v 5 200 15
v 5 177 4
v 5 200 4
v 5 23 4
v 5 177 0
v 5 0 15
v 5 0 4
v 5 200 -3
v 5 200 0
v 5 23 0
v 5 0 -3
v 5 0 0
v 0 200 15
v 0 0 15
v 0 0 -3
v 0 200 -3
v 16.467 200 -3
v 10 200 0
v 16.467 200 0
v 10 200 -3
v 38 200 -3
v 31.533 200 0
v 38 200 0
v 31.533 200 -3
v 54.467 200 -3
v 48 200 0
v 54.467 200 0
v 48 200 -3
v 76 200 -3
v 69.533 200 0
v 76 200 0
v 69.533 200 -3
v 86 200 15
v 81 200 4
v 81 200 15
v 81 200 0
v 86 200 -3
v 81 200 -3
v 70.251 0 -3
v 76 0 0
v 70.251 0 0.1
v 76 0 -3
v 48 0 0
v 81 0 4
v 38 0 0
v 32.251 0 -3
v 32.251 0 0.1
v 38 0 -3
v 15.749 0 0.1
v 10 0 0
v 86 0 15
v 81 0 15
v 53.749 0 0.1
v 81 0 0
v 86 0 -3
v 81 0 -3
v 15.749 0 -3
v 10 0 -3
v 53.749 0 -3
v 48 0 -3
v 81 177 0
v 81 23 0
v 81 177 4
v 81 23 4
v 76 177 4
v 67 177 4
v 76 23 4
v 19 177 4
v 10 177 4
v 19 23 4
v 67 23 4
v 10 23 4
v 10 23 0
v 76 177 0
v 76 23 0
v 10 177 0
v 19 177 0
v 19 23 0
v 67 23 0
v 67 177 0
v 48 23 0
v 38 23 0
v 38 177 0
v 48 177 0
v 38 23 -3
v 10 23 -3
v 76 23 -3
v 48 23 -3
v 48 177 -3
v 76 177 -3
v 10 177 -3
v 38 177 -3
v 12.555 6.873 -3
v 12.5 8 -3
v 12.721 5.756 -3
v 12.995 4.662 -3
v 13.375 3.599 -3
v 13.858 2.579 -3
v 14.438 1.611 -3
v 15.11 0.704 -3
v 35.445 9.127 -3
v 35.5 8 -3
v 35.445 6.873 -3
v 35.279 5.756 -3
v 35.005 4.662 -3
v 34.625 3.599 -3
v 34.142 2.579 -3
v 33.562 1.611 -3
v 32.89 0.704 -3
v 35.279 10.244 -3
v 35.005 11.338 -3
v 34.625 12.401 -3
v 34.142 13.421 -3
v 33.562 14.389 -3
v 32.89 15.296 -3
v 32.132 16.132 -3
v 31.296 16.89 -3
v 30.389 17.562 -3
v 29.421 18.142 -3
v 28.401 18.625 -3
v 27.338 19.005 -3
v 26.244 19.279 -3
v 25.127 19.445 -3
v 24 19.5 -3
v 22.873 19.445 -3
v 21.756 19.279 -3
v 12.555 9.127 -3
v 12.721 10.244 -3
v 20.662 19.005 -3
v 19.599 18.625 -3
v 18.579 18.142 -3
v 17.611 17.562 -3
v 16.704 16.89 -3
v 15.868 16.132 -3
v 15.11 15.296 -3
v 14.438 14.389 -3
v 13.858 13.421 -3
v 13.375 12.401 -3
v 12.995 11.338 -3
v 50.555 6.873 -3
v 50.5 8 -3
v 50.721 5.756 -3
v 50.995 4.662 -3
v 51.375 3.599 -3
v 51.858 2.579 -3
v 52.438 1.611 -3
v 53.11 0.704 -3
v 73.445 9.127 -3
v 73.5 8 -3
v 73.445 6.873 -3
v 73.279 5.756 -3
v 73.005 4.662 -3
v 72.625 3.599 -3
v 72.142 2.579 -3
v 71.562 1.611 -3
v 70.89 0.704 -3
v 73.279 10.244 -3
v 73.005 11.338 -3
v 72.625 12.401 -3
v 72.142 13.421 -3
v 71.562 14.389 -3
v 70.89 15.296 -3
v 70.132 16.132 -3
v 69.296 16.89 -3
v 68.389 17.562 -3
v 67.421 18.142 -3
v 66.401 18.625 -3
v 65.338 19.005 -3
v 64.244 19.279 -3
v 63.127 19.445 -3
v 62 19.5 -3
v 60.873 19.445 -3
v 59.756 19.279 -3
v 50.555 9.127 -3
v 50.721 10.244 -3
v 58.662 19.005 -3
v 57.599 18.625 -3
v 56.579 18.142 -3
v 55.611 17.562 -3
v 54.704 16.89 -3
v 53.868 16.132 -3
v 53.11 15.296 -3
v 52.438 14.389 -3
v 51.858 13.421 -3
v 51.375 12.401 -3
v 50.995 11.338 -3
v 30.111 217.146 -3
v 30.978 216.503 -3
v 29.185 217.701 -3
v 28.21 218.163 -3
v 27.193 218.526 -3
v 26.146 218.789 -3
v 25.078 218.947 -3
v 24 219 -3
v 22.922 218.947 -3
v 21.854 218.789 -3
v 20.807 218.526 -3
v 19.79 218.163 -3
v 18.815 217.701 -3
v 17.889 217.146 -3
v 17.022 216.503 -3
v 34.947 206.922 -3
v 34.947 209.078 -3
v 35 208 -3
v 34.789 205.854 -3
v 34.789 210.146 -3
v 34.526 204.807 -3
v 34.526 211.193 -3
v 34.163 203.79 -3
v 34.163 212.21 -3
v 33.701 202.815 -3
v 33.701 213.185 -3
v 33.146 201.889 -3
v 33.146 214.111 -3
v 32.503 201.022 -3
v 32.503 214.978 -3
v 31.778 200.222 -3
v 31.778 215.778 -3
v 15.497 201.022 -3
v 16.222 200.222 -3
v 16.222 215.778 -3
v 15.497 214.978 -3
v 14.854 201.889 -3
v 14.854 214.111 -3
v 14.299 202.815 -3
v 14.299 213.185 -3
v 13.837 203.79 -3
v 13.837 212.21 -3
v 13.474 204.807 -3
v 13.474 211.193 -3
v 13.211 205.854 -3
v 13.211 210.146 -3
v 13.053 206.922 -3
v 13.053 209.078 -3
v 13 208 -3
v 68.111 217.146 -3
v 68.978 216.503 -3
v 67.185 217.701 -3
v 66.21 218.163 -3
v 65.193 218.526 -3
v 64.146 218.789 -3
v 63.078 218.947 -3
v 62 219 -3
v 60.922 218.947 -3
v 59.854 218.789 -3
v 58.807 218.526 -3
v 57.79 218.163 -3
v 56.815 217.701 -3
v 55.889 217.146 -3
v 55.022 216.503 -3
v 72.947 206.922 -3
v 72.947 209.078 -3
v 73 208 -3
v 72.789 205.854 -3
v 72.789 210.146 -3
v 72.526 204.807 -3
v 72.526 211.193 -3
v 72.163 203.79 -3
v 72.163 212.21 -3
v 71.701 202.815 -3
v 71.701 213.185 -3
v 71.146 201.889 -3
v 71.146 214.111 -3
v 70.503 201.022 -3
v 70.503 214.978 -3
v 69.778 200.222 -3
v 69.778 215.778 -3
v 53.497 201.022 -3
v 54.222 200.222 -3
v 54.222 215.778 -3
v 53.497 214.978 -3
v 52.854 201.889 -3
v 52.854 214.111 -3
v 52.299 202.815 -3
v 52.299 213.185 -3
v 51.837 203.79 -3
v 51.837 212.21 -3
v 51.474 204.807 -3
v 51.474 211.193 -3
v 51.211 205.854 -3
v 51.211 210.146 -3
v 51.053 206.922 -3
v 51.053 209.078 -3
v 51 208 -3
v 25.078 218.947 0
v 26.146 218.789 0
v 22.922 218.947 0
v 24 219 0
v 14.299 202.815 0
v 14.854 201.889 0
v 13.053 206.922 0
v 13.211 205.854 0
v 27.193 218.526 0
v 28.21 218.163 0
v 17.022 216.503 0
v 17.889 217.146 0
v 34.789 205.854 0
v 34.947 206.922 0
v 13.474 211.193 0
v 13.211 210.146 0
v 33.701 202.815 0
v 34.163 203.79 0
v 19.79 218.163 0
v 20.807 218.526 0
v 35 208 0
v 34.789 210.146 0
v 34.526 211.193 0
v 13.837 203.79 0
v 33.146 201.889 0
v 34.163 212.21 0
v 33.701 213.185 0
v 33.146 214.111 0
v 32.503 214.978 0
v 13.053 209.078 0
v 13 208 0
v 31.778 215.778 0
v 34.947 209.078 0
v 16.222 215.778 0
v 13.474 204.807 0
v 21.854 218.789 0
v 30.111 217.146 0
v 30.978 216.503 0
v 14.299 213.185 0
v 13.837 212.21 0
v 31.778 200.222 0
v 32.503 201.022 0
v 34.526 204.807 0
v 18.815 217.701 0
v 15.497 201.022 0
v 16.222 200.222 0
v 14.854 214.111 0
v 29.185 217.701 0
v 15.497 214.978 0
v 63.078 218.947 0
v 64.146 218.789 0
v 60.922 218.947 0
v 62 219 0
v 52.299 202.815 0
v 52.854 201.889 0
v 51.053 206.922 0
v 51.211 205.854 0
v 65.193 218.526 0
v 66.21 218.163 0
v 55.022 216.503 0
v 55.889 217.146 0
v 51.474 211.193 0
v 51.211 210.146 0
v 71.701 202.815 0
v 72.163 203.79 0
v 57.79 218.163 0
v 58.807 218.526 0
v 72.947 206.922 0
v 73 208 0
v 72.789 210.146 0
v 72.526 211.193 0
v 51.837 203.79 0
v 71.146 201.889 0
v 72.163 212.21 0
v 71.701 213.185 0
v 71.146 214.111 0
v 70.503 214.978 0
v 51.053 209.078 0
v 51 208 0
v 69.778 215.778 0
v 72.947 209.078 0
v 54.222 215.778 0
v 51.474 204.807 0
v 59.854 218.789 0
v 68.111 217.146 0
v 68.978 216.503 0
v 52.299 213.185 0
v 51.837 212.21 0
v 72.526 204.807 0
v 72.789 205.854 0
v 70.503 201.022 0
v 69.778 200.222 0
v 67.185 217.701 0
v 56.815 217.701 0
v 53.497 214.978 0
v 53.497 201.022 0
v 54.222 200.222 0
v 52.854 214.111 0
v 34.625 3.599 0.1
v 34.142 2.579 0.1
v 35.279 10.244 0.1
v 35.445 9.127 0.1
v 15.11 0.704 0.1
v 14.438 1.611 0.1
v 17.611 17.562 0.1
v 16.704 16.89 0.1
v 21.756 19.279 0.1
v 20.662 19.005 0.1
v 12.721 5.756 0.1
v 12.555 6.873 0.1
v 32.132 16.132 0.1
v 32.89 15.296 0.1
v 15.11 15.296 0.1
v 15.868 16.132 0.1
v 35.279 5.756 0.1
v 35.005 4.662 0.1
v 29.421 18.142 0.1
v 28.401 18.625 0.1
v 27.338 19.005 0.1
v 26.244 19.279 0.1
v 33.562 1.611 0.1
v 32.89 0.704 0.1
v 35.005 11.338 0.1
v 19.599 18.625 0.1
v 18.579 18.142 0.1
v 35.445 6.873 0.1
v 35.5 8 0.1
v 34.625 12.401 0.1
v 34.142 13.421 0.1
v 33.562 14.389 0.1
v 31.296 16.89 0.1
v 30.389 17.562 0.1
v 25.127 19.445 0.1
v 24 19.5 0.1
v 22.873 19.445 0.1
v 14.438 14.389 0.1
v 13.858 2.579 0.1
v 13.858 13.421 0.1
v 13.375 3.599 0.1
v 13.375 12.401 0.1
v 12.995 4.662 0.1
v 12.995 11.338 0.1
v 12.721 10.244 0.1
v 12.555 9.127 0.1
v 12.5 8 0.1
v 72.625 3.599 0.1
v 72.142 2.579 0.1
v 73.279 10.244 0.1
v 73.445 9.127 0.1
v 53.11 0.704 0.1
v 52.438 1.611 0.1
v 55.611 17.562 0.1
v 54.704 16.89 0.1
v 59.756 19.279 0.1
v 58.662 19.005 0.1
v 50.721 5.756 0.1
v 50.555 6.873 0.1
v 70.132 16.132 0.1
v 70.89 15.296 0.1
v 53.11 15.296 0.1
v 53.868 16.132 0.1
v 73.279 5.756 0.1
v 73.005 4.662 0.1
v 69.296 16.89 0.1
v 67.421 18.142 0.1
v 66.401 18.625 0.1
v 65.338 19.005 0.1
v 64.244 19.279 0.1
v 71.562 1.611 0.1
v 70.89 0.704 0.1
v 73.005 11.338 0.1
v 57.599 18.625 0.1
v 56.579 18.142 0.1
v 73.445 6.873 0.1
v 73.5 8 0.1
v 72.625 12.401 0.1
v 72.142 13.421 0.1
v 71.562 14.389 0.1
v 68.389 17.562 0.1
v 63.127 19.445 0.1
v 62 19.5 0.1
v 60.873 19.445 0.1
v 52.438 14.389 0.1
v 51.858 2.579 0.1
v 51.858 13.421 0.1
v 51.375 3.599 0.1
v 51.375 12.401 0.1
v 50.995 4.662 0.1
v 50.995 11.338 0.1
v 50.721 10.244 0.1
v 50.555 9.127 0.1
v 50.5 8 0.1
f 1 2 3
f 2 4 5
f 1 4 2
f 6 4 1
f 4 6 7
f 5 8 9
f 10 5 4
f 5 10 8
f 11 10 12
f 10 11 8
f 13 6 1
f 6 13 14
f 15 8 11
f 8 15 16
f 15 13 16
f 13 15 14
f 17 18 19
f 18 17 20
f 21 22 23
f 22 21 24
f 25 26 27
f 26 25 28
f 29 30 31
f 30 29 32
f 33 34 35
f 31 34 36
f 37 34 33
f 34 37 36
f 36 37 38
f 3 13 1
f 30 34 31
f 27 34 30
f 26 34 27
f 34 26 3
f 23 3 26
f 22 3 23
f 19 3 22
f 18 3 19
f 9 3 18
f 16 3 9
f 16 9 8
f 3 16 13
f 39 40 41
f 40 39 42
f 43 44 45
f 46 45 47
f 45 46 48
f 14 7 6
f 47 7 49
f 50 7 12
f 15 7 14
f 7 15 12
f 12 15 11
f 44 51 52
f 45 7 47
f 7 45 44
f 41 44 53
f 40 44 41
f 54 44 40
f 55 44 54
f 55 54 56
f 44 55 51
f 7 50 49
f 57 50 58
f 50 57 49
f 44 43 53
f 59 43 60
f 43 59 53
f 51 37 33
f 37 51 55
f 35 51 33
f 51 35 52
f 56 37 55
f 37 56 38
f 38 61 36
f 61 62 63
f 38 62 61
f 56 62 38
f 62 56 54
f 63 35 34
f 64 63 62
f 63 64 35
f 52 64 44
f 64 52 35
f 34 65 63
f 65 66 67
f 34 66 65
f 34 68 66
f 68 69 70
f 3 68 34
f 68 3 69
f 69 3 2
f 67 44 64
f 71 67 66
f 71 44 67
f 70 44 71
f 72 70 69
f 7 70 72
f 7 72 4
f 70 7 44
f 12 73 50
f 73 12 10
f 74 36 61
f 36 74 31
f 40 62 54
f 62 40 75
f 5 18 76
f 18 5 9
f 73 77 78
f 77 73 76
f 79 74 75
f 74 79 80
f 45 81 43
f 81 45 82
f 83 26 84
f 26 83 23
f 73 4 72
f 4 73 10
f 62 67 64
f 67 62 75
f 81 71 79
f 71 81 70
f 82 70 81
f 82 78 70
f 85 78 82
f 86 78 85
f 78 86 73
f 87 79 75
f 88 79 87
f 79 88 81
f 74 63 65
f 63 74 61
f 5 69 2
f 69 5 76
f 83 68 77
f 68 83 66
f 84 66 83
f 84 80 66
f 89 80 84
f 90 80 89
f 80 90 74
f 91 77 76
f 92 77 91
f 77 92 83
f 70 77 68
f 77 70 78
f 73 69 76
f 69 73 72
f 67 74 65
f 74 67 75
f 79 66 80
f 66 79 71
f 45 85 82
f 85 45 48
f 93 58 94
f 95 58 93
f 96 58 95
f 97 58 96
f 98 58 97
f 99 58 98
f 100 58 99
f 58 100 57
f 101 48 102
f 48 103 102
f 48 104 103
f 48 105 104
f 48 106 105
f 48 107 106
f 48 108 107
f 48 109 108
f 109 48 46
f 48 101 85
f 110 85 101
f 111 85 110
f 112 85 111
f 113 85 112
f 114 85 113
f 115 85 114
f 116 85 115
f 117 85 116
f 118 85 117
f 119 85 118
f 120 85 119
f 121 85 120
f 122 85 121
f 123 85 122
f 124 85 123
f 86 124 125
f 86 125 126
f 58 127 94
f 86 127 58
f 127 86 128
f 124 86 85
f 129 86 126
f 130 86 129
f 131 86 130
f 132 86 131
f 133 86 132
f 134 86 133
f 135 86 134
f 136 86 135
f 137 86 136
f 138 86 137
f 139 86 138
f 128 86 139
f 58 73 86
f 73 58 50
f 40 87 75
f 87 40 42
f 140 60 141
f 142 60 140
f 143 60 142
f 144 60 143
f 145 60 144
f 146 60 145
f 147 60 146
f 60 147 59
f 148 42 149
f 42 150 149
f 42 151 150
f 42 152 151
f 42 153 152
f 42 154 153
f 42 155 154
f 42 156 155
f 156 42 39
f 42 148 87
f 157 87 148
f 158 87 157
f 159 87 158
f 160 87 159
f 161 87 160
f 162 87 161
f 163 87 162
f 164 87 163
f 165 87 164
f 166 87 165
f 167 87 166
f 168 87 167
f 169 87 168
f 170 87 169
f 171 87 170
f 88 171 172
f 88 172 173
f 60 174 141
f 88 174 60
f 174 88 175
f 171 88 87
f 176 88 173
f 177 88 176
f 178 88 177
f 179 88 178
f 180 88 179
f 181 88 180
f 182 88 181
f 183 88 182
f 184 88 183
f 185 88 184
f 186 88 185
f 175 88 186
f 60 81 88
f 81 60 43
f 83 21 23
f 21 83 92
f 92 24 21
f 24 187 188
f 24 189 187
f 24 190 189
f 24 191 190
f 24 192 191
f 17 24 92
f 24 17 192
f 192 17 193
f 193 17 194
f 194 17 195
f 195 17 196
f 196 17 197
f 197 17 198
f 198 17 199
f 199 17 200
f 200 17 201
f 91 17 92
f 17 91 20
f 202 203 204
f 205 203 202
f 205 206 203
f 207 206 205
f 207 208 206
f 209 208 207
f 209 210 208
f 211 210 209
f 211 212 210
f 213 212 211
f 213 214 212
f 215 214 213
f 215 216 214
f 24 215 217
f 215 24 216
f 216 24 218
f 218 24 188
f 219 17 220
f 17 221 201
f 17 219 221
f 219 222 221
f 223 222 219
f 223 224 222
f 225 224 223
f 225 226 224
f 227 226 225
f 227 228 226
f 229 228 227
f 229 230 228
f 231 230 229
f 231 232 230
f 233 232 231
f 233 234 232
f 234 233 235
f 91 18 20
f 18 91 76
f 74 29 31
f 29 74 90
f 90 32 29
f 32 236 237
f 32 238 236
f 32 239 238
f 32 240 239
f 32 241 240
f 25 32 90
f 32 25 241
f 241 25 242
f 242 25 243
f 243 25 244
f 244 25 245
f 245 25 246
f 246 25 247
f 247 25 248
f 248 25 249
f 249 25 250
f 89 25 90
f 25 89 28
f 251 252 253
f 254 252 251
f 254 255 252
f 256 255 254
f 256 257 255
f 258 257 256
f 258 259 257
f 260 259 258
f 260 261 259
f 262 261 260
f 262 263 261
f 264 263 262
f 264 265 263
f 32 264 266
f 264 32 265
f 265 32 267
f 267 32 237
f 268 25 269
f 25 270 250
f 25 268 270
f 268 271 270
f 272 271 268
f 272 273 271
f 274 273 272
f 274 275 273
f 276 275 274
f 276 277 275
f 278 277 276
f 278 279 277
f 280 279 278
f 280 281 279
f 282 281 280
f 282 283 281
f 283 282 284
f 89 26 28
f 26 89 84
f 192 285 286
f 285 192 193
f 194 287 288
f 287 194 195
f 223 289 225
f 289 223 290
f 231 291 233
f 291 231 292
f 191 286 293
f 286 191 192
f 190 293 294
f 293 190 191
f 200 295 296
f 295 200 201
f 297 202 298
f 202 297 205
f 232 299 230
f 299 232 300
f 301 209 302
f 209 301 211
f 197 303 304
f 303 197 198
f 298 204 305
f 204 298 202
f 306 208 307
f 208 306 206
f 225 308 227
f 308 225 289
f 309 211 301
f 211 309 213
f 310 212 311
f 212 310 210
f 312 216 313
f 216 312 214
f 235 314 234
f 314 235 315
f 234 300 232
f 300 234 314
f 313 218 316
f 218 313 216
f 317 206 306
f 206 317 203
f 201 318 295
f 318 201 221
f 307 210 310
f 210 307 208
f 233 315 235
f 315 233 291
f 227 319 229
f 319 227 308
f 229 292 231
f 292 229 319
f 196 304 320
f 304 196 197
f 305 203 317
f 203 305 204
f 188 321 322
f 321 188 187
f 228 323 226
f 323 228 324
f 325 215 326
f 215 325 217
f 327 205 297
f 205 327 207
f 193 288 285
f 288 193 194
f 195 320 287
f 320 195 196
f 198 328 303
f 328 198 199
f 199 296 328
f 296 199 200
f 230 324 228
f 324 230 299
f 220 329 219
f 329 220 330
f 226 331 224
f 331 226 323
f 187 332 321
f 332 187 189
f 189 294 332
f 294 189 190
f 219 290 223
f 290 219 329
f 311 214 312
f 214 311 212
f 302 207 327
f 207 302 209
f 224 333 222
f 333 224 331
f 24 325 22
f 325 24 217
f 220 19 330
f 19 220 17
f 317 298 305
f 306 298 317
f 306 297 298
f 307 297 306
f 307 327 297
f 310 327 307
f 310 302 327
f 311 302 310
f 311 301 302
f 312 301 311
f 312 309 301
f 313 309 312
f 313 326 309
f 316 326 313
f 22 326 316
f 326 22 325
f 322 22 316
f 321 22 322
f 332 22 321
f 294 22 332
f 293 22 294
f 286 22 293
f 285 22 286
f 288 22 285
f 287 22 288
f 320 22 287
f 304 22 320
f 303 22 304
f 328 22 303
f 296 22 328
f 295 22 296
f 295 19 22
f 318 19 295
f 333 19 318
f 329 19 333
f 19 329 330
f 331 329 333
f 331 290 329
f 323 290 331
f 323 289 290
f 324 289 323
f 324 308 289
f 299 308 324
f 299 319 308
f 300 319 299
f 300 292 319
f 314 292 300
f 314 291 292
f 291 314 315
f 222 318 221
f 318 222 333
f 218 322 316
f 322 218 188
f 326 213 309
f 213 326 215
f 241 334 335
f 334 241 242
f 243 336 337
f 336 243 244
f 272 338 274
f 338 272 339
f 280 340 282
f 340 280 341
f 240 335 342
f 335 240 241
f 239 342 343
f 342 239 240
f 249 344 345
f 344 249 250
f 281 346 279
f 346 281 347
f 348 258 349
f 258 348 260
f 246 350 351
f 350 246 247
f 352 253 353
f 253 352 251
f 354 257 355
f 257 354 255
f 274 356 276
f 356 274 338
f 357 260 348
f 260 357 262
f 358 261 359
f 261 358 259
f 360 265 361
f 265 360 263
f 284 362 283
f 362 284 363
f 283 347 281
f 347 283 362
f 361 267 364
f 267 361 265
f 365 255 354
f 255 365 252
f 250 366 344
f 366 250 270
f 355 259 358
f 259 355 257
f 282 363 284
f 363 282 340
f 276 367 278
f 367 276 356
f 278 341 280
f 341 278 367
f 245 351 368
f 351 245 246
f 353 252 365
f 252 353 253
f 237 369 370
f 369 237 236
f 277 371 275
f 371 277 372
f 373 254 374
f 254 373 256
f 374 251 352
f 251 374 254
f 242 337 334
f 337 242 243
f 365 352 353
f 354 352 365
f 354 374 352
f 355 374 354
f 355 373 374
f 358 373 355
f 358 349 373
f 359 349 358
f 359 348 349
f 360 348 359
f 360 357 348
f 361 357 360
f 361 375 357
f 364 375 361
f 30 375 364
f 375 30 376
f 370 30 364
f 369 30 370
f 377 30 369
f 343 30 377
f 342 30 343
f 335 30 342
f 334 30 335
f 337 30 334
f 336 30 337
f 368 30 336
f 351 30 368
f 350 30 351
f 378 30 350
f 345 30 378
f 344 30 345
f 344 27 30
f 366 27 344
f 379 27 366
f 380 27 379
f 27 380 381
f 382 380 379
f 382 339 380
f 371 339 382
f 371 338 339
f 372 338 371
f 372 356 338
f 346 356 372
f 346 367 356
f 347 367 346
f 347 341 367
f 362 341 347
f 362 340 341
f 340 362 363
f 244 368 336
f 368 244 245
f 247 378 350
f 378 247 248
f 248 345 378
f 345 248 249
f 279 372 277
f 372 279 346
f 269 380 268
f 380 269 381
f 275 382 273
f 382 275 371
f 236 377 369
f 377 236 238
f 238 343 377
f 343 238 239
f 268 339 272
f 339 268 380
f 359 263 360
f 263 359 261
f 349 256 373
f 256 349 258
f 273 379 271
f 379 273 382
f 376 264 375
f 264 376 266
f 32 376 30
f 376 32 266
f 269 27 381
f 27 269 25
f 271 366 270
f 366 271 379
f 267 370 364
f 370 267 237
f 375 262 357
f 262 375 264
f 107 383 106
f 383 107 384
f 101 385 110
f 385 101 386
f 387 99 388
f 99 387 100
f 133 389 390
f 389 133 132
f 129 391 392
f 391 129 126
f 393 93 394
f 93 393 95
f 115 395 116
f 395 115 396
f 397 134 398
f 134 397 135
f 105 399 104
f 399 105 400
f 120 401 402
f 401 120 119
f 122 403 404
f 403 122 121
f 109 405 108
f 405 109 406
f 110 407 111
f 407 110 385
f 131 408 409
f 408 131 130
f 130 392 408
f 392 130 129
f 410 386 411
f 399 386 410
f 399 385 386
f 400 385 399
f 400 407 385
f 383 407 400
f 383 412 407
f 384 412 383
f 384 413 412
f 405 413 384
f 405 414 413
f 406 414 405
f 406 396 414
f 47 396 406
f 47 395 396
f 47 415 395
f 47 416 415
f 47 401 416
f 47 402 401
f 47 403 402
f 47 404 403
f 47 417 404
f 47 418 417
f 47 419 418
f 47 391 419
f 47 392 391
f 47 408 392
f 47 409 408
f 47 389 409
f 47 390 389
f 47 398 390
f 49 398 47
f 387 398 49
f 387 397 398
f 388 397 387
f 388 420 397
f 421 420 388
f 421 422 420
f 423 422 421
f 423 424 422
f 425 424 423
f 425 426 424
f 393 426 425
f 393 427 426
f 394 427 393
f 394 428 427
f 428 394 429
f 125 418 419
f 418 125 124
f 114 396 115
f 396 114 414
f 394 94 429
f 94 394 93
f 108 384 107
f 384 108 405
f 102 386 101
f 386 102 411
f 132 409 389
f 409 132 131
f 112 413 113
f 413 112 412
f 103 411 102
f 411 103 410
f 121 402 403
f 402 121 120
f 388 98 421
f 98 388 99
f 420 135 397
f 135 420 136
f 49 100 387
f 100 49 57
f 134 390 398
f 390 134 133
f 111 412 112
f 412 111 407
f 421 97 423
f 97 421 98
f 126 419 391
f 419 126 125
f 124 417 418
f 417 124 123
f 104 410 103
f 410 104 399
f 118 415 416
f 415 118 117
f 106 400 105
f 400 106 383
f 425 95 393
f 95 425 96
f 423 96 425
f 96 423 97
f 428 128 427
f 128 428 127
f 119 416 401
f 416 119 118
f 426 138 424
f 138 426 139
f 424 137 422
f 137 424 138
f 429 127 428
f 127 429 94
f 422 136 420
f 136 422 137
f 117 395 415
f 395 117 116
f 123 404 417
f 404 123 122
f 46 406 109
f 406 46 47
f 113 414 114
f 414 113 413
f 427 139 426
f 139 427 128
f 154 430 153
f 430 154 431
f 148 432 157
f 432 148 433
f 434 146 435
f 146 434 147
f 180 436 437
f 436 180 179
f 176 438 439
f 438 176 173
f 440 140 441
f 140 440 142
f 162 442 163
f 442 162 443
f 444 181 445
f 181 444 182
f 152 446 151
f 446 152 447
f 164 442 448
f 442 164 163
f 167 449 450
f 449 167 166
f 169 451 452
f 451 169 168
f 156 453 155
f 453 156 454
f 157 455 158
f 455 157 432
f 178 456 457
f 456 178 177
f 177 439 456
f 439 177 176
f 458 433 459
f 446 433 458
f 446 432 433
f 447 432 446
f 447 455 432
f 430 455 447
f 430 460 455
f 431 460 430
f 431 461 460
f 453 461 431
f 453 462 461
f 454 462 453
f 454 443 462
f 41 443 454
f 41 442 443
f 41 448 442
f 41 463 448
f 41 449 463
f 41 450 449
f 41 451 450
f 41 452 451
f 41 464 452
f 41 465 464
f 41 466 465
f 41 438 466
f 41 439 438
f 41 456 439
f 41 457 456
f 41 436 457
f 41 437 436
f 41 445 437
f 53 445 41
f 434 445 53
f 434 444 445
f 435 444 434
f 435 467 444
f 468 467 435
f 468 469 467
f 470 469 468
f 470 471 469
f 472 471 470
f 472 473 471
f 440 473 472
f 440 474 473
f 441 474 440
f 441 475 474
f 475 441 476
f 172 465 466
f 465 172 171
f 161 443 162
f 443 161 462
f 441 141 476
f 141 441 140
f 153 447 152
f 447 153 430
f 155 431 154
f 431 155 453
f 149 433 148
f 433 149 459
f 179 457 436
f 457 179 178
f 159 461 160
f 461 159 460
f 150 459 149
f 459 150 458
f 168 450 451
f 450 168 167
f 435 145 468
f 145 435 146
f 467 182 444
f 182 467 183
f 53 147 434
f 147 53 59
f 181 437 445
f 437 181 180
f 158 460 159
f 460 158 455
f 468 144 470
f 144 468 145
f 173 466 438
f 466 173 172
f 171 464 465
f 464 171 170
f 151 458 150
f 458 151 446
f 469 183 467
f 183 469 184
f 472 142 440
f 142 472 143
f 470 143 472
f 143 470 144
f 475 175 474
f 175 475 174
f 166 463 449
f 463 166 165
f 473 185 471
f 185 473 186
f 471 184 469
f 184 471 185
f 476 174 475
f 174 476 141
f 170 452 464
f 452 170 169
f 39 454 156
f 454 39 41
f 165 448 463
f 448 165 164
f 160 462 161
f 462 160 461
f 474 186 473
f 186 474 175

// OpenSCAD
// file: params.scad
// ── Shared parameters for card track system ──────────────────────────────────

// 608ZZ skateboard bearing
bearing_od = 22;
bearing_id = 8;
bearing_w  = 7;

// Track channel (straight and corner sections share this profile)
// body 50 mm + posts 10 mm each side = 70 mm total → 3 mm clearance each side in 76 mm channel
track_inner_w   = 76;    // inner width of U-channel
track_wall_h    = 11;    // wall height above floor
track_wall_t    = 5;     // wall thickness
track_floor_t   = 4;     // floor thickness
track_sec_len   = 200;   // length of one straight section

// Bearing contact floor rails — narrow floor strips along the two bearing lines.
// The floor is ONLY present at (a) these two rails and (b) full-width end sections
// under the connector pads.  Everything else is open to save material.
//
//  Floor plan view (bottom of straight section):
//   [=====END FLOOR=====]  ← full width, conn_pad_len deep
//   |  |             |  |
//   |  | rail   rail |  |  ← two 9 mm rails running full length
//   |  |             |  |
//   [=====END FLOOR=====]
//
// Rail X positions: bearing midpoint sits at (channel_centre ± body_half ∓ bearing_w/2)
// Left  rail centre: track_wall_t + track_inner_w/2 − cart_body_w/2 − bearing_w/2
// Right rail centre: track_wall_t + track_inner_w/2 + cart_body_w/2 + bearing_w/2
bear_rail_w = bearing_w + 2;  // 9 mm — bearing width + 2 mm margin

// Track end connectors — puzzle-piece tabs on the track underside.
// The two outer walls extend bot_ext mm below the floor face (Z=0); connector
// pads fill the gap between them at each end.  No side protrusions — the cart
// channel is completely clear.
//
//  Side view at end face (track lying on table):
//
//    ════════════════════════  ← track walls / floor (Z = 0 and up)
//    |   [ pad ]  [ pad ]  |  ← connector pads hang below floor
//    |___[_tab__]_[_tab__]_|  ← tabs protrude beyond the end face
//      left wall        right wall
//

tab_neck_w   = 12;           // neck width
tab_neck_l   = 8;            // neck length (protrusion from pad end face)
tab_knob_d   = 22;           // knob diameter — wider than neck, creates interlock
tab_clr      = 1.0;          // total clearance on width/diameter (0.5 mm per side)

conn_pad_w   = tab_knob_d + 6;                  // 28 mm — pad / tab cross-section width
conn_pad_len = tab_neck_l + tab_knob_d / 2 + 4; // 23 mm — pad depth / tab reach

// Height of wall extension below Z=0; also the extrusion height of the connector pads.
bot_ext = 3;

// X centres of the two connector pads — quarter-points of the inner channel.
// Pad 1 centre ≈ 24 mm from left edge; Pad 2 centre ≈ 62 mm from left edge.
// (track_wall_t = 5; inner = 76; quarters at 5+19=24 and 5+57=62)
bot_conn_x1 = track_wall_t + track_inner_w * 0.25;
bot_conn_x2 = track_wall_t + track_inner_w * 0.75;

// Cart
cart_plate   = 200;    // 200 × 200 mm top plate
plate_t      = 4;      // plate thickness (thicker to give pegs something to grip)
// body is 50 mm wide; posts (10 mm each side) bring total to 70 mm → 3 mm clearance each side in 76 mm channel
cart_body_w  = 50;
cart_body_h  = 22;     // height of cart body — reduced 4 mm from original 26 mm
wheelbase    = 120;    // front-to-rear axle spacing
cart_body_len = wheelbase + 20;  // 140 mm front-to-rear
cart_wall_t   = 7;               // hollow cart body wall thickness (all four sides)

// Alignment pegs (body → plate)
// Pegs sit at the 4 solid corners of the body top face, outside the lightening pocket.
// Plate holes are through-holes; pegs protrude above the plate surface for grip during gluing.
peg_d    = 4.0;   // peg cylinder diameter
peg_h    = 7.0;   // peg height above body top face (extends 3 mm above plate)
hole_d   = 4.3;   // plate hole diameter (0.3 mm clearance — easy slide, glue fills gap)

// Stub-axle posts (bearing friction-fit over post)
post_d       = 8.2;   // 0.2 mm press-fit onto 608ZZ bore (8 mm)
// post breakdown: 1.5 mm shoulder gap + 7 mm bearing + 1.5 mm retention nose = 10 mm
post_len     = 10;
// post centre sits 9 mm above cart body bottom face:
//   bearing centre = 11 mm above track floor  (= bearing_od/2)
//   cart body bottom clears floor by 2 mm      (= 11 - 9)
post_z       = 9;

// Circular relief cut into the body side face at each post base.
// Prevents the bearing outer race from rubbing against the body during spin.
bearing_relief_d     = bearing_od + 4;   // 26 mm diameter
bearing_relief_depth = 1.5;              // axial depth of relief pocket

// Corner
corner_inner_r = 100;  // inner radius of corner track centre-line
// main file
include <params.scad>

// ── Straight track section (200 mm) ──────────────────────────────────────────
// Print flat on bed.
//
// Floor is open between the two bearing-contact rails and the end connector
// sections — only material that is structurally required is printed.
//
// +Y end: two puzzle tabs protrude below the floor level from the bottom pads.
// -Y end: two matching puzzle sockets cut into the bottom pads.

track_total_w = track_inner_w + 2 * track_wall_t;
track_total_h = track_floor_t + track_wall_h;

// ── Bearing rail X positions in track coordinates ─────────────────────────────
// Left  bearing contact: channel_centre − cart_body_half − bearing_mid
// Right bearing contact: channel_centre + cart_body_half + bearing_mid
bear_cx_L = track_wall_t + track_inner_w / 2 - cart_body_w / 2 - bearing_w / 2;
bear_cx_R = track_wall_t + track_inner_w / 2 + cart_body_w / 2 + bearing_w / 2;

// ── 2D puzzle profiles ────────────────────────────────────────────────────────
module puzzle_tab_2d() {
    translate([-tab_neck_w / 2, 0])
        square([tab_neck_w, tab_neck_l]);
    translate([0, tab_neck_l])
        circle(d = tab_knob_d, $fn = 64);
}

module puzzle_socket_2d() {
    translate([-(tab_neck_w + tab_clr) / 2, 0])
        square([tab_neck_w + tab_clr, tab_neck_l + tab_clr / 2]);
    translate([0, tab_neck_l])
        circle(d = tab_knob_d + tab_clr, $fn = 64);
}

// ── Track body ────────────────────────────────────────────────────────────────
// Built as a union of discrete structural elements — no subtractive floor.
module track_body() {
    union() {
        // Left wall — full length, full height, plus bot_ext below Z=0
        translate([0, 0, -bot_ext])
            cube([track_wall_t, track_sec_len, track_total_h + bot_ext]);
        // Right wall
        translate([track_total_w - track_wall_t, 0, -bot_ext])
            cube([track_wall_t, track_sec_len, track_total_h + bot_ext]);

        // End floor — full width, conn_pad_len deep at each end
        cube([track_total_w, conn_pad_len, track_floor_t]);
        translate([0, track_sec_len - conn_pad_len, 0])
            cube([track_total_w, conn_pad_len, track_floor_t]);

        // Bearing contact rails — narrow strips running the full length
        translate([bear_cx_L - bear_rail_w / 2, 0, 0])
            cube([bear_rail_w, track_sec_len, track_floor_t]);
        translate([bear_cx_R - bear_rail_w / 2, 0, 0])
            cube([bear_rail_w, track_sec_len, track_floor_t]);
    }
}

// ── Bottom connector pads (between walls, below floor face) ───────────────────
module bot_conn_pads(y0) {
    for (cx = [bot_conn_x1, bot_conn_x2])
        translate([cx - conn_pad_w / 2, y0, -bot_ext])
            cube([conn_pad_w, conn_pad_len, bot_ext]);
}

// ── Bottom tab: protrudes beyond end face in +Y ───────────────────────────────
module bot_tab(cx, y_face) {
    translate([cx, y_face, -bot_ext])
        linear_extrude(height = bot_ext)
            puzzle_tab_2d();
}

// ── Bottom socket: cut into pad, opening at y_face ────────────────────────────
module bot_socket(cx, y_face) {
    translate([cx, y_face, -bot_ext - 0.1])
        linear_extrude(height = bot_ext + 0.2)
            puzzle_socket_2d();
}

// ── Assembled straight section ────────────────────────────────────────────────
difference() {
    union() {
        track_body();
        bot_conn_pads(0);
        bot_conn_pads(track_sec_len - conn_pad_len);
        for (cx = [bot_conn_x1, bot_conn_x2])
            bot_tab(cx, track_sec_len);
    }
    for (cx = [bot_conn_x1, bot_conn_x2])
        bot_socket(cx, 0);
}
